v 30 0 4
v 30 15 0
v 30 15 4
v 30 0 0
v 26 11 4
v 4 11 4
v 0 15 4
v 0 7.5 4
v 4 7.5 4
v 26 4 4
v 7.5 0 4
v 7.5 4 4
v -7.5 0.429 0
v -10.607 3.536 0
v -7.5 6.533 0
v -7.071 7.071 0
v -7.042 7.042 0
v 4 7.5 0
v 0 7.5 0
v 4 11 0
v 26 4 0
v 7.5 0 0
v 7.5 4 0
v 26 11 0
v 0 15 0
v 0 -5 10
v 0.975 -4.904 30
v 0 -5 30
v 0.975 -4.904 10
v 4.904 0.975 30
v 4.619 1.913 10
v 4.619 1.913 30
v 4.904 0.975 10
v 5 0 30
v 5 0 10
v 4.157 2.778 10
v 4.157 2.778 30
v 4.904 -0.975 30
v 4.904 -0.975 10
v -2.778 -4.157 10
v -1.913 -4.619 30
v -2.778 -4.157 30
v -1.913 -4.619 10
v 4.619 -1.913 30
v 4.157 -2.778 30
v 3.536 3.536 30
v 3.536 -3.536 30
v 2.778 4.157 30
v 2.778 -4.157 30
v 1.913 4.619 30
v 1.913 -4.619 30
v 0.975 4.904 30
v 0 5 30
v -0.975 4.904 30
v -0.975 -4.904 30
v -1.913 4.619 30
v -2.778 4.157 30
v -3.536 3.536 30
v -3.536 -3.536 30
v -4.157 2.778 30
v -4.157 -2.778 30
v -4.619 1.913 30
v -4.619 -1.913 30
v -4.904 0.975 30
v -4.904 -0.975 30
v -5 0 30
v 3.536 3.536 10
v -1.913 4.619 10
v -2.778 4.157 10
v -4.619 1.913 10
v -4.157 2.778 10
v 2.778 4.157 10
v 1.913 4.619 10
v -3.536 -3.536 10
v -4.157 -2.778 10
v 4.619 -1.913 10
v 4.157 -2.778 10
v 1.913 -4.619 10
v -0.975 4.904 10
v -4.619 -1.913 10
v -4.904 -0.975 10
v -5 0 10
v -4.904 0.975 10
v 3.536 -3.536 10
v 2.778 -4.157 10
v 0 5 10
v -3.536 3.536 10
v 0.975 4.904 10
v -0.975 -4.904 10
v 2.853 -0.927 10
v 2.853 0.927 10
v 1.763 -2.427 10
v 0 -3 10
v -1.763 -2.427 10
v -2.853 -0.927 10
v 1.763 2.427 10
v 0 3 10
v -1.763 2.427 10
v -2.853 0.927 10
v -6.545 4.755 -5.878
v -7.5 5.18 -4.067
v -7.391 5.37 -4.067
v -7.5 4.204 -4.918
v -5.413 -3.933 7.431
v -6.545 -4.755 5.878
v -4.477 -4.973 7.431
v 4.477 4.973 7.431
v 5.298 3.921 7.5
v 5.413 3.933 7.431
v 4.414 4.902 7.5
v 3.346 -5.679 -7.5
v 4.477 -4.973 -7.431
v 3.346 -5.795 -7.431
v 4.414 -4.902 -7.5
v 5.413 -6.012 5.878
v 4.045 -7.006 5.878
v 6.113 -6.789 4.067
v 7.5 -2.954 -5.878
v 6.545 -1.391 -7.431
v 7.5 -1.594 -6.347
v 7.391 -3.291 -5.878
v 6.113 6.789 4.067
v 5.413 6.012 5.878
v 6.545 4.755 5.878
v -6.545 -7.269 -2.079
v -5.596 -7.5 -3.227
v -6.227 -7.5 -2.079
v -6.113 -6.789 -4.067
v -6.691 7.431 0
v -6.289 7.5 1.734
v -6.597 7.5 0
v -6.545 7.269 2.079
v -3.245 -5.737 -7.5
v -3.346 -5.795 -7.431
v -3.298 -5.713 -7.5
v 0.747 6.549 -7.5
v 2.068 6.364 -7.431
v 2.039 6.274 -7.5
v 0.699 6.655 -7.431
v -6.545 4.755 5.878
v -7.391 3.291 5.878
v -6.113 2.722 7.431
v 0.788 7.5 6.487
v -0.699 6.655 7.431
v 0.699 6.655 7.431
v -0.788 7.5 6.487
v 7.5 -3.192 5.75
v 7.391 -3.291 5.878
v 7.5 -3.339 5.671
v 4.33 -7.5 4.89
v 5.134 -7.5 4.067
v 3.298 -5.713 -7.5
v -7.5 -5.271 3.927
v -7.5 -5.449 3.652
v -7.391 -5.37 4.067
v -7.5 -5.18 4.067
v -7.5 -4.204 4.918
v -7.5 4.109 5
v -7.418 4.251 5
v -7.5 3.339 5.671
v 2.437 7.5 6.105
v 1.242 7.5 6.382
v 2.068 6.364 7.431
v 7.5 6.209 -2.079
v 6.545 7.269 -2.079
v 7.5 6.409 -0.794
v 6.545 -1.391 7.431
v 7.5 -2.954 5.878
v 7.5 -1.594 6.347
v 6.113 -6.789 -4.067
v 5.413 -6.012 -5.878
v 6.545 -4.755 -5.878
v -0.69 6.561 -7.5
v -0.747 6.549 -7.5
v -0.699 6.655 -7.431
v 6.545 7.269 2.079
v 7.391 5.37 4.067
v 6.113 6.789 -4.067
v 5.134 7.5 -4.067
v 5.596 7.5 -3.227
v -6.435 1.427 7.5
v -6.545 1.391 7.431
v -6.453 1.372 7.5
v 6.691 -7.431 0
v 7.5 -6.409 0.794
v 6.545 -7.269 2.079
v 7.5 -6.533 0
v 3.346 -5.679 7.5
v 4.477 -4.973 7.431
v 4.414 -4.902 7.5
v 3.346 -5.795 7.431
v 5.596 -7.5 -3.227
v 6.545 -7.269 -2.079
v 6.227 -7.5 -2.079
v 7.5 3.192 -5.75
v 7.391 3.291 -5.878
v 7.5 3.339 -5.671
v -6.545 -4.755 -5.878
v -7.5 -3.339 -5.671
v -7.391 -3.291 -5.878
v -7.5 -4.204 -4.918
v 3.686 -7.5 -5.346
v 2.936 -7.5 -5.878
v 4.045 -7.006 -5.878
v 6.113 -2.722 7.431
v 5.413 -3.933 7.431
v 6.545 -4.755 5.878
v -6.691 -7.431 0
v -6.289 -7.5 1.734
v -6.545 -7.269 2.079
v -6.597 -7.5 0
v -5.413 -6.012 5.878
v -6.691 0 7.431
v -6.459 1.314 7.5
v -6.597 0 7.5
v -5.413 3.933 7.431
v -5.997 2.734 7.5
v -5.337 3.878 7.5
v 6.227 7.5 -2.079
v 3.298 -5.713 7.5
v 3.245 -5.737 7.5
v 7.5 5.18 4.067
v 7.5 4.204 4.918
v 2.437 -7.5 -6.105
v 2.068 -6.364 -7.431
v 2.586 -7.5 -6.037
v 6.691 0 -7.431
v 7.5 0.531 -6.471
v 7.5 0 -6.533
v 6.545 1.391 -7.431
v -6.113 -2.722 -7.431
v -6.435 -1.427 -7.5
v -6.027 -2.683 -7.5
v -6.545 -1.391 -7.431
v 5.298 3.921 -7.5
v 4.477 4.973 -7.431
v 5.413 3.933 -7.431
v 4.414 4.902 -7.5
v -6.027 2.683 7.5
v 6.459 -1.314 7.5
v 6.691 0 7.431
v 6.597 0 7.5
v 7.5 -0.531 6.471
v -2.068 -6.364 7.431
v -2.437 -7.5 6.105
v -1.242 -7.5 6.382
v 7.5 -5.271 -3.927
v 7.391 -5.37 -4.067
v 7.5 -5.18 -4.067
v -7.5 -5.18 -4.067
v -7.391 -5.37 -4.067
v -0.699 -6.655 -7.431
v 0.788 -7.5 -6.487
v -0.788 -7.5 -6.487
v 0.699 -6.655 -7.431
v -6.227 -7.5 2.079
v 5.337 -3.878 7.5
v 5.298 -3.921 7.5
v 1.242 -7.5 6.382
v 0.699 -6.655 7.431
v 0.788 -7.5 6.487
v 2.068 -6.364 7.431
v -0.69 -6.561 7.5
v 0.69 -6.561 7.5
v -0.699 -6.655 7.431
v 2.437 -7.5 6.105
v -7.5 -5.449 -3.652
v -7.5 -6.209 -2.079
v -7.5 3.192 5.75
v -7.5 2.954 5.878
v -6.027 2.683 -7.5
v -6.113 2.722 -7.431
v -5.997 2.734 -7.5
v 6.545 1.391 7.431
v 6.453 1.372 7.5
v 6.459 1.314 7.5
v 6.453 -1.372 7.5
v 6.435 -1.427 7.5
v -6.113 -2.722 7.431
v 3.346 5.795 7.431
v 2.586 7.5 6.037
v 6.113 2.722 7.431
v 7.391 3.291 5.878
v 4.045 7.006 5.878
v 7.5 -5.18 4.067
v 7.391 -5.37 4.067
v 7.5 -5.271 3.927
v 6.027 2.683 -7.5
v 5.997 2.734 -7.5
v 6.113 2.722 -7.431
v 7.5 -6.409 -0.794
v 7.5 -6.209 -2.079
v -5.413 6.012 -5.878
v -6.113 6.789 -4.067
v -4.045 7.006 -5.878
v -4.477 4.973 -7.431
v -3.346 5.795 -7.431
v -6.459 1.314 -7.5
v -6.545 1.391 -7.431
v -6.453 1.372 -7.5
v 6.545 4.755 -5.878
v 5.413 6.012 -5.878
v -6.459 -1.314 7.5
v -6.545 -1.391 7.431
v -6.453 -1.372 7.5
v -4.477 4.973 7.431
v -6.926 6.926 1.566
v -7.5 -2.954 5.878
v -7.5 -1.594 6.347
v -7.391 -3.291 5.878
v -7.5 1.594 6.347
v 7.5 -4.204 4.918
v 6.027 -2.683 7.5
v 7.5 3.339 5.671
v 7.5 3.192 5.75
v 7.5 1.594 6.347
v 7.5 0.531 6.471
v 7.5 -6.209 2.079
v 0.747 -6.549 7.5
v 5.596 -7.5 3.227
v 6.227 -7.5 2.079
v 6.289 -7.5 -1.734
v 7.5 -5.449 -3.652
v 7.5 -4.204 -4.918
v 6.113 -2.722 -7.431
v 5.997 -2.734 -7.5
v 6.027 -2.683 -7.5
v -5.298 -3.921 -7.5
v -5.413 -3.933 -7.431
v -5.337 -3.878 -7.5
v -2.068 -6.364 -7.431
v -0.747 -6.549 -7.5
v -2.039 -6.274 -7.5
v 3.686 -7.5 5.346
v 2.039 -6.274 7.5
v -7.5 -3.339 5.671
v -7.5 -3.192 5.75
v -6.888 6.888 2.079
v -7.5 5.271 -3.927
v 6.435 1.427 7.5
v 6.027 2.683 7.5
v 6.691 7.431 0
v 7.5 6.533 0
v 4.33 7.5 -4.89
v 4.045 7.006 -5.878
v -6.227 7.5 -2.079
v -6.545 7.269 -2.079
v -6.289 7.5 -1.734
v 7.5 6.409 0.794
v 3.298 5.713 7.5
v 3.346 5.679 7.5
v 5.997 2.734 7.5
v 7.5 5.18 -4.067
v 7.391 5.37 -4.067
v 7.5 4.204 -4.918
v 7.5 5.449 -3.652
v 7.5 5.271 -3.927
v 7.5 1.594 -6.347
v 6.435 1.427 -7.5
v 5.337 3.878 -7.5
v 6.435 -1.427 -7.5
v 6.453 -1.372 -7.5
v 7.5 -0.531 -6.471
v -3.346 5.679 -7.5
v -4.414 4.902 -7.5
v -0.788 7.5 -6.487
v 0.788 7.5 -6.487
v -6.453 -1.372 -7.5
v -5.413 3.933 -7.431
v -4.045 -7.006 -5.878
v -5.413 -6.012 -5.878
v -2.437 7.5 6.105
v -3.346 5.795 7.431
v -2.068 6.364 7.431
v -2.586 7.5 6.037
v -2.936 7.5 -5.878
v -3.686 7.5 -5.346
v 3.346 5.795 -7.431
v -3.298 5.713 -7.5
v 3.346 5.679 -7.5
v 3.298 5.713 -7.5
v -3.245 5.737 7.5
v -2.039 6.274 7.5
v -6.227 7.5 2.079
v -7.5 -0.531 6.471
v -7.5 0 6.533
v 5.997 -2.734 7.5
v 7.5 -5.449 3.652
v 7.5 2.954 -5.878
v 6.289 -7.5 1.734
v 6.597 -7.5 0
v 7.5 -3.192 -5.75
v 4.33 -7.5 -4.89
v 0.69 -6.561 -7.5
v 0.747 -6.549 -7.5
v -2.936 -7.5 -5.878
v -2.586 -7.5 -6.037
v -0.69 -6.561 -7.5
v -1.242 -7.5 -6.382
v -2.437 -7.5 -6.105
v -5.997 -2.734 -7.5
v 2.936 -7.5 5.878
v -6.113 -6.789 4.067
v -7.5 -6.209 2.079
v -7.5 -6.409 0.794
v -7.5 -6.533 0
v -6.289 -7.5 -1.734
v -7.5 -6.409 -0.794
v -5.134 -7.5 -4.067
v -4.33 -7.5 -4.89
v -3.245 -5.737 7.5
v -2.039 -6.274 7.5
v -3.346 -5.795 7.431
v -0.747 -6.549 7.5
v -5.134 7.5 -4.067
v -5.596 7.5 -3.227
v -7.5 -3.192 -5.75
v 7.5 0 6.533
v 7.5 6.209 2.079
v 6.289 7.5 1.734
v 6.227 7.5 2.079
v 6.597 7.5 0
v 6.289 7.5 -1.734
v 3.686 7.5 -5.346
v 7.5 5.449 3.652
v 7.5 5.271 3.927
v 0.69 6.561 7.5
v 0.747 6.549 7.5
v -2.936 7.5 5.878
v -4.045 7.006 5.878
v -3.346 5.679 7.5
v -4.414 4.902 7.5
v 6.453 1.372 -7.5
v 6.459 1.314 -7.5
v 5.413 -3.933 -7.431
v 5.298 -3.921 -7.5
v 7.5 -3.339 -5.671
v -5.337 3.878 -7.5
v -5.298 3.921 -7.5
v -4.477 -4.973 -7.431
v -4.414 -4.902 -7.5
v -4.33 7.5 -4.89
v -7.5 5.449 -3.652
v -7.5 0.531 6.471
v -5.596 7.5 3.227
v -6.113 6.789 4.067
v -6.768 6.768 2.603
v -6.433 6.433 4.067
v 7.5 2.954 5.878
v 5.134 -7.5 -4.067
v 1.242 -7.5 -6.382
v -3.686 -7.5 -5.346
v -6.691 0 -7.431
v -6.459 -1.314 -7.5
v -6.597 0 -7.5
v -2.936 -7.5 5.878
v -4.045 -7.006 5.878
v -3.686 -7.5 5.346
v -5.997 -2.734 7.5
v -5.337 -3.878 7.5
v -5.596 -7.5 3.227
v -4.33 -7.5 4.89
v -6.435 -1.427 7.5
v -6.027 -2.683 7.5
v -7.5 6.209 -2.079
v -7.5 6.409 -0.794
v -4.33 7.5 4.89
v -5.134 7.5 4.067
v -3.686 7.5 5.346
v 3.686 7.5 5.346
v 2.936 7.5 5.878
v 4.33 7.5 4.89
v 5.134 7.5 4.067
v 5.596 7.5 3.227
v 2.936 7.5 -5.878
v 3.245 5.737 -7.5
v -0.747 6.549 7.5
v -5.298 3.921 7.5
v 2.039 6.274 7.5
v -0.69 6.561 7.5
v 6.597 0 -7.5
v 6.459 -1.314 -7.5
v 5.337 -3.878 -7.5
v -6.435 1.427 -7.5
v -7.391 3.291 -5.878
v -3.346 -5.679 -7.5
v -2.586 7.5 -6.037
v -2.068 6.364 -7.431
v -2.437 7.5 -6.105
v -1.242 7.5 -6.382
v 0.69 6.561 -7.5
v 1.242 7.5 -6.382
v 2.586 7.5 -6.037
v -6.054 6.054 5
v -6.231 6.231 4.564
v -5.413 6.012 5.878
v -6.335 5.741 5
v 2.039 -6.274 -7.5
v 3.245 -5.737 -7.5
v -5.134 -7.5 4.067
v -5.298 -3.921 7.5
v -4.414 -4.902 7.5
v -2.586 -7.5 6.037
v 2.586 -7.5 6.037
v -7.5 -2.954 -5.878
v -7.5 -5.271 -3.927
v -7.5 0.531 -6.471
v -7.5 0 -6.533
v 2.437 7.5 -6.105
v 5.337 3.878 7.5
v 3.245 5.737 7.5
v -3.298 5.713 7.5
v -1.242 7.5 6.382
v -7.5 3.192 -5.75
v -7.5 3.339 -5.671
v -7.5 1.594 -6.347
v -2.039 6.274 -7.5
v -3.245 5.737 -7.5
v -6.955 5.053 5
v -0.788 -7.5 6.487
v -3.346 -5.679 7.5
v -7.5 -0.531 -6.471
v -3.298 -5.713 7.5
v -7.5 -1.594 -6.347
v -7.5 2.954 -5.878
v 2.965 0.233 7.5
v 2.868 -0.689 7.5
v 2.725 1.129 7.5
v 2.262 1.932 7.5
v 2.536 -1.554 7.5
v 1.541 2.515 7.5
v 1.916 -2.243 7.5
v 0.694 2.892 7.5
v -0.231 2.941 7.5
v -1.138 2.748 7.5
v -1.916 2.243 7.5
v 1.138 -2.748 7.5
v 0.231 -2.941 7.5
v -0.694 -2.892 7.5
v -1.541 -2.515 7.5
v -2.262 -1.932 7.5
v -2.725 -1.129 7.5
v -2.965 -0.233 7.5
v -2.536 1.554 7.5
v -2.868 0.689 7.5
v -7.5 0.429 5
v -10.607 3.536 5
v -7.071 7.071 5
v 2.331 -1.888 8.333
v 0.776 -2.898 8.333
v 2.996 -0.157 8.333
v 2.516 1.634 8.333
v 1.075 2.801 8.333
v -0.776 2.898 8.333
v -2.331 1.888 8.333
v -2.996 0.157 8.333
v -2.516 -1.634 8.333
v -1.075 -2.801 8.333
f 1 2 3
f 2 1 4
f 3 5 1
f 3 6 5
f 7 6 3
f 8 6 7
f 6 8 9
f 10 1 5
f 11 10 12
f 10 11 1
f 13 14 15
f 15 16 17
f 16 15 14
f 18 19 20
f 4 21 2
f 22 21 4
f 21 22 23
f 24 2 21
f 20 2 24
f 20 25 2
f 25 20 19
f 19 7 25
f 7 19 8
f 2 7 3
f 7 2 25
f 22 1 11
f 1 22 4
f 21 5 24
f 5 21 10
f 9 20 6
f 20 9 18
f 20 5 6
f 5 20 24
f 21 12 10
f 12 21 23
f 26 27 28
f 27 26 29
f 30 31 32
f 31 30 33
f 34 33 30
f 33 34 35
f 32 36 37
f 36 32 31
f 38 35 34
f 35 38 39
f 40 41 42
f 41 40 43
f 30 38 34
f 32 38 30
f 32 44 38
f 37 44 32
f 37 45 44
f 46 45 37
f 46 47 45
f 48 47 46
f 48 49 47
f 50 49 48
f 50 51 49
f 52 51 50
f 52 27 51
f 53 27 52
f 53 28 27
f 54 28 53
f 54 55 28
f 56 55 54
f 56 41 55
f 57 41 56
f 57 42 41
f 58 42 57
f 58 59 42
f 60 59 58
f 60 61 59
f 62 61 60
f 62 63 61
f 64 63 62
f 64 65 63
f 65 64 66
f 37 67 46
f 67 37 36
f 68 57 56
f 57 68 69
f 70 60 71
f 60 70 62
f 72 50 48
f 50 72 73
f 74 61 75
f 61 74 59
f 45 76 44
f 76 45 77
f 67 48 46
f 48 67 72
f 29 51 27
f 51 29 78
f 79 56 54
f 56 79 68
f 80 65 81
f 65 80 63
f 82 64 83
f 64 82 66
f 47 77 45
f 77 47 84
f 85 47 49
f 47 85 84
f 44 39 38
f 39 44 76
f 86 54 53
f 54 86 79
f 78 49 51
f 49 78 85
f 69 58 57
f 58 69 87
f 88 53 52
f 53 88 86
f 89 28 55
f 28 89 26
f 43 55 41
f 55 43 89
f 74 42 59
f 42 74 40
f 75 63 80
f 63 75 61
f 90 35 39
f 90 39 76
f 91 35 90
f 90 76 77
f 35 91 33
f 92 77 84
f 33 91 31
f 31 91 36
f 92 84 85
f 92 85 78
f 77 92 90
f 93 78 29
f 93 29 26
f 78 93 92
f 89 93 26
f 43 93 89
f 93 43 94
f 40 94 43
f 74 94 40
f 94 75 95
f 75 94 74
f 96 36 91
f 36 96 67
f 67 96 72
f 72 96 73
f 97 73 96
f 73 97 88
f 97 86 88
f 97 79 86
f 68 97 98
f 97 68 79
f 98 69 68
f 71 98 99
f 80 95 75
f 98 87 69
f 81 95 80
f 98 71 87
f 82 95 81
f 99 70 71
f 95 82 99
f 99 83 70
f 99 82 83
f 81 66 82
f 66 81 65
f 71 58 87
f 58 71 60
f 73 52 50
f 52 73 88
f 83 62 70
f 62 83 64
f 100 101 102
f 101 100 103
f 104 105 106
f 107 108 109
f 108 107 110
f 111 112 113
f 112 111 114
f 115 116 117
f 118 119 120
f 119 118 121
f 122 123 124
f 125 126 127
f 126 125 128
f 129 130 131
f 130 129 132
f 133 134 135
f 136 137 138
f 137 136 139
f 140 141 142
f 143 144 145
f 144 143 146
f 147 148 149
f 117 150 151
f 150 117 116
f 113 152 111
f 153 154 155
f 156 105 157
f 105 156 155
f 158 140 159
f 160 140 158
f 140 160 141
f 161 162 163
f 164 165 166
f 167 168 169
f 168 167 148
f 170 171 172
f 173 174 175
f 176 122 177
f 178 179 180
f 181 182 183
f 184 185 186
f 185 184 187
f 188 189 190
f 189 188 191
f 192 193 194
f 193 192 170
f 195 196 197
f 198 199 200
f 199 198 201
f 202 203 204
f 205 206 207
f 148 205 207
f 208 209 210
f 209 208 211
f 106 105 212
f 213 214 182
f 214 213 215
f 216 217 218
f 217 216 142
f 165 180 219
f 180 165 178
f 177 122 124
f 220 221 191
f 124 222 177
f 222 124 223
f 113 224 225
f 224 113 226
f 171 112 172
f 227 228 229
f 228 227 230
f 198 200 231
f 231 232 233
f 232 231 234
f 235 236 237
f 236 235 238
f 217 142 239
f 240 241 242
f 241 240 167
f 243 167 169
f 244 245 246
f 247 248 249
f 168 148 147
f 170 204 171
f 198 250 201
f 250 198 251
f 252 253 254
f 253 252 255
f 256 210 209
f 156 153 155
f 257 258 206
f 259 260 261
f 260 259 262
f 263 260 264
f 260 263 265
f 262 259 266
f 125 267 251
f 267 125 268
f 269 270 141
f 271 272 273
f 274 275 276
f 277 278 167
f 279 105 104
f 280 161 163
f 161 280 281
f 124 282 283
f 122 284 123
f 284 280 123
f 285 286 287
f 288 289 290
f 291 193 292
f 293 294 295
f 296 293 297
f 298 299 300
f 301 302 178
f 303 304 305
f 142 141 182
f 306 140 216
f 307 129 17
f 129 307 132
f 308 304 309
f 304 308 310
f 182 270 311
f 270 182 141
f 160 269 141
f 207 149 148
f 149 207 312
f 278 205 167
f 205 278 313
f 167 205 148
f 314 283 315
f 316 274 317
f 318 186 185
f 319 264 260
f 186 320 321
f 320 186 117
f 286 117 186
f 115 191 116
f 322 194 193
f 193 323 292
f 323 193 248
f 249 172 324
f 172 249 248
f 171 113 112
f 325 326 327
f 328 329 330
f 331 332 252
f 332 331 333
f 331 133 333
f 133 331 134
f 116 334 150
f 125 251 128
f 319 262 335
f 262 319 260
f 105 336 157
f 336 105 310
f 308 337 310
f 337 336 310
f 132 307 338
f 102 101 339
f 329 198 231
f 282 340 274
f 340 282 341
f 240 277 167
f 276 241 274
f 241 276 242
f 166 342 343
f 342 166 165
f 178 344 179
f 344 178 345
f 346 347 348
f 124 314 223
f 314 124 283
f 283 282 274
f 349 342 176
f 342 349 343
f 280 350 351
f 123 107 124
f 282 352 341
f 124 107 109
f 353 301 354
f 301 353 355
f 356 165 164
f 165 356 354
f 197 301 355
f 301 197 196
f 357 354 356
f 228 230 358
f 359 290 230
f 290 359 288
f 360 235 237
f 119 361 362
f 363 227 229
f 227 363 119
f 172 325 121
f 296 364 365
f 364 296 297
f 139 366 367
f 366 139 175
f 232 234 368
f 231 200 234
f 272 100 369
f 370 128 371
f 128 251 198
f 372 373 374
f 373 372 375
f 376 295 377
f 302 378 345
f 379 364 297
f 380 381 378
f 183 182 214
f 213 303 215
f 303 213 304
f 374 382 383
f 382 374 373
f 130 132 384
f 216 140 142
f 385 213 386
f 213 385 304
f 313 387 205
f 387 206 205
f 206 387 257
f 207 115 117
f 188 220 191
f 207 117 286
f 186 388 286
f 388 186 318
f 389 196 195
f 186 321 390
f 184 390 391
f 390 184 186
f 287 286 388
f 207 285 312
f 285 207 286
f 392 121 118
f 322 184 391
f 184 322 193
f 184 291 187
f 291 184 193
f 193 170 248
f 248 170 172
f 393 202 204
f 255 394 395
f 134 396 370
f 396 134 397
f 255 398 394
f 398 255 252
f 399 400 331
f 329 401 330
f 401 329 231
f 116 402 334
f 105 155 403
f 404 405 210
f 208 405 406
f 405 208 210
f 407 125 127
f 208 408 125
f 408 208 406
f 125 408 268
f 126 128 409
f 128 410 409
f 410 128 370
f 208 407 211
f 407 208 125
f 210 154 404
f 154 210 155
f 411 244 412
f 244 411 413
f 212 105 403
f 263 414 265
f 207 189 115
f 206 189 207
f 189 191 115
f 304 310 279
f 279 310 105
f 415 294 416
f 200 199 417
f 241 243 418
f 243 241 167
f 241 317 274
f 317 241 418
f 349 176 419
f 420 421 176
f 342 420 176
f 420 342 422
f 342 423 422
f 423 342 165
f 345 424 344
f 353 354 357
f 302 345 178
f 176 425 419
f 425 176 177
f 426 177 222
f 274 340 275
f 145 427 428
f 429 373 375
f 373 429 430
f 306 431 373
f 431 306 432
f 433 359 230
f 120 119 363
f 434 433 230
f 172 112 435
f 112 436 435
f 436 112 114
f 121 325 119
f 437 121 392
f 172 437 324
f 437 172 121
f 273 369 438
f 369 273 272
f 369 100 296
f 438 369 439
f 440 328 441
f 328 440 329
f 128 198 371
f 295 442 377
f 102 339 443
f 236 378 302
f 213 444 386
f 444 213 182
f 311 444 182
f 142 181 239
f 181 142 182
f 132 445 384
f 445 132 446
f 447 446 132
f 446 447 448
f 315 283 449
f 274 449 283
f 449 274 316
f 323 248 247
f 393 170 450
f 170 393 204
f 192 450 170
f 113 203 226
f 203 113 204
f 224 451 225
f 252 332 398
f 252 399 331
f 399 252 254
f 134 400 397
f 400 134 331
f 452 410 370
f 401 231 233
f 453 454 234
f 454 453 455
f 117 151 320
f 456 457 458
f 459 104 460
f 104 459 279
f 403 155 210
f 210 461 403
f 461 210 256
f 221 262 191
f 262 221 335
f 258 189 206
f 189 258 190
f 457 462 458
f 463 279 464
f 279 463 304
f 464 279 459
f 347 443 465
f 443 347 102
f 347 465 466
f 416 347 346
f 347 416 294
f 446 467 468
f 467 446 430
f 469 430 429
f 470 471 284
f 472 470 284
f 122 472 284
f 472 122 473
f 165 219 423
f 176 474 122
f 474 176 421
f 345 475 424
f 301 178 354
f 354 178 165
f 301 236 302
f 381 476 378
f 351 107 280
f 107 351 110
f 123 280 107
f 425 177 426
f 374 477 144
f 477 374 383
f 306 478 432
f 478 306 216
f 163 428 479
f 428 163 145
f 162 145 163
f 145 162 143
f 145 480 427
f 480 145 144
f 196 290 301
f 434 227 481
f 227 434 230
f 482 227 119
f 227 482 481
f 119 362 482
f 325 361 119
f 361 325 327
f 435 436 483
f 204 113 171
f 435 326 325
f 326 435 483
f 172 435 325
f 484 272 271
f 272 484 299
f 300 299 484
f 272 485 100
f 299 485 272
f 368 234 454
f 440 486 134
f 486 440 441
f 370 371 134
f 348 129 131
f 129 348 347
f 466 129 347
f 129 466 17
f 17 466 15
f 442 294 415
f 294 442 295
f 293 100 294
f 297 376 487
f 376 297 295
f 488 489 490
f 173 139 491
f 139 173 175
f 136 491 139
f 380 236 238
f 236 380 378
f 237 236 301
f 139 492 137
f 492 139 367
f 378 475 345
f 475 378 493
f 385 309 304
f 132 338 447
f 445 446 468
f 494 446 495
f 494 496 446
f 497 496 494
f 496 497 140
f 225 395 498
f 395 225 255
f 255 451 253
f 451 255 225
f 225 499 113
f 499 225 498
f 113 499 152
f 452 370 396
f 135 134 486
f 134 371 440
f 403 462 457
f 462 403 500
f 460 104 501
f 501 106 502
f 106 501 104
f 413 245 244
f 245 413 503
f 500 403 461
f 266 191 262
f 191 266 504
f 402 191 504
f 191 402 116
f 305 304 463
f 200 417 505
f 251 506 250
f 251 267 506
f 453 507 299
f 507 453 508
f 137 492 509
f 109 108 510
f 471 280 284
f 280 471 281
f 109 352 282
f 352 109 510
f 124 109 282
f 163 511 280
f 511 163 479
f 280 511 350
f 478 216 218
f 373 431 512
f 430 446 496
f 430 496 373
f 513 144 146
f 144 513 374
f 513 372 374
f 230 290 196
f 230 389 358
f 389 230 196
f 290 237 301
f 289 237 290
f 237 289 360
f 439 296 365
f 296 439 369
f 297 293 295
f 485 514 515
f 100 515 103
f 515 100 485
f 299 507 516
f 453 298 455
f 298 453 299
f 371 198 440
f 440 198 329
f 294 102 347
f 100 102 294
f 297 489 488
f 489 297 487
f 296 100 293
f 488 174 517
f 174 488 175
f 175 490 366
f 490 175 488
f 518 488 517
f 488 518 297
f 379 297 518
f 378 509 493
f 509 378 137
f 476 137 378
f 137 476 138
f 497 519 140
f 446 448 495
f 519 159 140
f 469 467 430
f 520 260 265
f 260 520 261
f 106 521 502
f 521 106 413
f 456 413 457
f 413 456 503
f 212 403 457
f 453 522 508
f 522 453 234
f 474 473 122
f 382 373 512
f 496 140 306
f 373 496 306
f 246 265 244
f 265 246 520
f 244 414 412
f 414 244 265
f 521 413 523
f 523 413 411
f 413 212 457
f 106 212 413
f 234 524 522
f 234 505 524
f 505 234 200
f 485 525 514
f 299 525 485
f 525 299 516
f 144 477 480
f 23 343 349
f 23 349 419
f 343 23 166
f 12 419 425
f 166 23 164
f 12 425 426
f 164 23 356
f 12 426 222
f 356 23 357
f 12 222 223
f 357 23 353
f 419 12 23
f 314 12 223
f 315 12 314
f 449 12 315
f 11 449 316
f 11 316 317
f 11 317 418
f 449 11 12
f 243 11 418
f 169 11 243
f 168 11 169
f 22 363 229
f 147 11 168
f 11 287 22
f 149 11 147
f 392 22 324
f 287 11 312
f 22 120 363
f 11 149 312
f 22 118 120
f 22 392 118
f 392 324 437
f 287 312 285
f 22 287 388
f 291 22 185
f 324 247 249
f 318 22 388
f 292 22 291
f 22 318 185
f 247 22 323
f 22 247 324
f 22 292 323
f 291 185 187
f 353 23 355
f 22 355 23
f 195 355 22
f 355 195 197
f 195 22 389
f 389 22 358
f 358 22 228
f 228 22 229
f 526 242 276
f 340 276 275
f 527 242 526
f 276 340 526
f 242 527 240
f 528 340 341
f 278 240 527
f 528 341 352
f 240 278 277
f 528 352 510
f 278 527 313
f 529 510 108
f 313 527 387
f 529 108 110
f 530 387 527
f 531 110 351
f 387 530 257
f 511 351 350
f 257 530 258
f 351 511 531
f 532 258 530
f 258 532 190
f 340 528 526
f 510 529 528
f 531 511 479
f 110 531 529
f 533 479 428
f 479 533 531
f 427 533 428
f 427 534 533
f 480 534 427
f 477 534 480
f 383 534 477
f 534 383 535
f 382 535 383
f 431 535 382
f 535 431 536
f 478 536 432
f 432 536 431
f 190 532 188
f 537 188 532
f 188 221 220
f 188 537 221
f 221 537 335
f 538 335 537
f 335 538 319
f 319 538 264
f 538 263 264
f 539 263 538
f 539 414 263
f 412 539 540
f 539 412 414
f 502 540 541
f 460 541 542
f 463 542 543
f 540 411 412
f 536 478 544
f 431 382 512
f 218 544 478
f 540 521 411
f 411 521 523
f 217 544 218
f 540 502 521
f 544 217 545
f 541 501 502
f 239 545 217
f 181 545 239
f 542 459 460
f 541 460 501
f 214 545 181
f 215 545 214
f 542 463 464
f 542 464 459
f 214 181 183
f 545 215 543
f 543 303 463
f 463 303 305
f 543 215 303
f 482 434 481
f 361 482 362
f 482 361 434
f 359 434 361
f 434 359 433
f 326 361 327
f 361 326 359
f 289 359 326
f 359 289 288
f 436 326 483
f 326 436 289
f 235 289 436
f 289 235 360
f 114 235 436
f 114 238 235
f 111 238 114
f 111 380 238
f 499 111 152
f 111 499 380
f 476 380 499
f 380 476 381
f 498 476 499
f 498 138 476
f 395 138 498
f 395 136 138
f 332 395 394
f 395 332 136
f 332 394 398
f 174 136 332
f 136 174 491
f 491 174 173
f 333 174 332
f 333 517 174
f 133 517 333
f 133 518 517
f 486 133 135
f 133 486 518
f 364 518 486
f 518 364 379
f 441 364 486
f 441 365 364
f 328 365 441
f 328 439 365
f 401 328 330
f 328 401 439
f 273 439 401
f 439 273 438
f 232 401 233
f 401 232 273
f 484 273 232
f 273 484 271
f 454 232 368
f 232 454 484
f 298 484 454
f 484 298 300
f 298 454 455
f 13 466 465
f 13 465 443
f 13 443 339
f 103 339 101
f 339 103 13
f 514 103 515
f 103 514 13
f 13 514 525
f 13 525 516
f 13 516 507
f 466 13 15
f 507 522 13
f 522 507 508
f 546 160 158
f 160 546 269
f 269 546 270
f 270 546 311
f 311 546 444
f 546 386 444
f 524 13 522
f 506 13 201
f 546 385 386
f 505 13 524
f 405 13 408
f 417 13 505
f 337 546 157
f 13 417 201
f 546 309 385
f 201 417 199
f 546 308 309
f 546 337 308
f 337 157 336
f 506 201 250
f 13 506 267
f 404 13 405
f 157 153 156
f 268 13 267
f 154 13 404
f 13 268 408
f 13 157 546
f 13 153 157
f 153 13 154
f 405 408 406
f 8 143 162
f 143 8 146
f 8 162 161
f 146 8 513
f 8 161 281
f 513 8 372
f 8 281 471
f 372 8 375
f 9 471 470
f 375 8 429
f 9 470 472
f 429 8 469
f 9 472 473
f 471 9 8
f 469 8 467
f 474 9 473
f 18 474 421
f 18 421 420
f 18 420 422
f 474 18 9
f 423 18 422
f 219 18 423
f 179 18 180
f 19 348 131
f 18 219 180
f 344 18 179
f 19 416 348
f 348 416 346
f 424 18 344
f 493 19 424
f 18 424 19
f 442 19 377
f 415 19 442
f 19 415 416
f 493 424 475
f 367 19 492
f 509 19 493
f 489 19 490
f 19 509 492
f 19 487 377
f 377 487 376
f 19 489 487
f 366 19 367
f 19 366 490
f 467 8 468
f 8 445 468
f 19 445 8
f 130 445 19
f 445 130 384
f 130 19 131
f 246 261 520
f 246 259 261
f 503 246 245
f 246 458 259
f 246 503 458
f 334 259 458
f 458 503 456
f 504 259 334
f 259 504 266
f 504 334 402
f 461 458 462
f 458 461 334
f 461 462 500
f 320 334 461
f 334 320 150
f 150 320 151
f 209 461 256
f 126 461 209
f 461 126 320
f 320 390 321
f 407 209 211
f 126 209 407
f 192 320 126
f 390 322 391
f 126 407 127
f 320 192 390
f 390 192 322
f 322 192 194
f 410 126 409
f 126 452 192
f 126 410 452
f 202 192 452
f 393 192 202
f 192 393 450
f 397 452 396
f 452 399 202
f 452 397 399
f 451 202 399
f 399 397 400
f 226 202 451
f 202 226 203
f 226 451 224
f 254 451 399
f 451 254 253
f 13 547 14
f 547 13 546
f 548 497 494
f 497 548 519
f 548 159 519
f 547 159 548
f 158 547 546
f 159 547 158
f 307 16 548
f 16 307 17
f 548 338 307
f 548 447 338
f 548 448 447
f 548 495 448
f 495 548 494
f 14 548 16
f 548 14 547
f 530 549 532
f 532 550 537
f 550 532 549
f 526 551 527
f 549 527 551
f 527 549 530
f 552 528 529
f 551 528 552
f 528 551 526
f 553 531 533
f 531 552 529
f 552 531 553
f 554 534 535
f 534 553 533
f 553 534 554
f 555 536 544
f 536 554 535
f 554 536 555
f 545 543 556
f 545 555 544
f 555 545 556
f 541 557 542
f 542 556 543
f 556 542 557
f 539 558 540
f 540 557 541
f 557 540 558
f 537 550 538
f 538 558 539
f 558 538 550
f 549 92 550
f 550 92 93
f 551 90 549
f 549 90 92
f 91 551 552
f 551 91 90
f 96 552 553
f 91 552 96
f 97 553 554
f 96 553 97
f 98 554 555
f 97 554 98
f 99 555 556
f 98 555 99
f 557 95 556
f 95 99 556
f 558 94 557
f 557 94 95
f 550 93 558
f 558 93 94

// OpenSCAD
// basic primitives, transforms, booleans, modules, functions
module bracket(w=20, h=10, thickness=3) {
    difference() {
        cube([w, h, thickness]);
        translate([thickness, thickness, -1])
            cube([w - 2 * thickness, h - 2 * thickness, thickness + 2]);
    }
}

function midpoint(a, b) = (a + b) / 2;

union() {
    bracket(30, 15, 4);
    translate([0, 0, 10]) {
        cylinder(h=20, r=5, $fn=32);
    }
}

intersection() {
    sphere(r=10);
    cube([15, 15, 15], center=true);
}

rotate([0, 0, 45])
    scale([1, 2, 1])
        mirror([1, 0, 0])
            color("red")
                cube(5);

linear_extrude(height=10, twist=90)
    circle(r=3);

rotate_extrude(angle=180)
    translate([5, 0, 0])
        square([2, 4]);
